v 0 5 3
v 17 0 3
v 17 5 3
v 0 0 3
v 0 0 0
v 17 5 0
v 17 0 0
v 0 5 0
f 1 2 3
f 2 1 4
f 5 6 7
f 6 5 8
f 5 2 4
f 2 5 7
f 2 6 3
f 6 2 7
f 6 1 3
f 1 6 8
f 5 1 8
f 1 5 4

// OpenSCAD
// Generated by SolidPython 1.0.1 on 2020-07-29 00:46:56


cube(size = [17, 5, 3]);
/***********************************************
*********      SolidPython code:      **********
************************************************
 
# import packages: SolidPython
from solid import *
from solid.utils import *
from itertools import chain, combinations, permutations


class Resize:

    def __init__(self, scad_file):
        self.scad_file = scad_file
        #self.scad_file = import_scad(scad_file)
        # cone/cylinder param:
        self.r1 = 0
        self.r2 = 0
        self.h = 0
        # rectangular prism param:
        self.w = 0
        self.l = 0
        # ellipse param:
        self.r = 0

    # import OpenScad code (file name corresponds to shape)


    # classify shape + parameters
    def assign(self, param1, param2, param3):
        if self.scad_file == 'cone.scad':
            self.r1 = param1
            self.r2 = param2
            self.h = param3
        elif self.scad_file == 'cylinder.scad':
            self.r1 = param1
            self.r2 = param2
            self.h = param3
        elif self.scad_file == 'rectangularPrism.scad':
            self.h = param1
            self.l = param2
            self.w = param3
        else:
            self.r = param1
            self.h = param2

    # resize parameters
    def iterate(self):
        x = range(3, 20, 2)
        i = 1
        if self.scad_file == 'cone.scad':
            tempList = list(permutations(x, 2))
            for temp in tempList:
                param1 = temp[0]
                param2 = temp[1]
                filepath = 'produced_scad_files/' + 'cone' + str(param1) + '_' + str(param2) + '_' + '.scad'
                scad_render_to_file(cylinder(h=param1, r1=param2, r2=0), filepath)

        elif self.scad_file == 'cylinder.scad':
            tempList = list(permutations(x, 3))
            for temp in tempList:
                param1 = temp[0]
                param2 = temp[1]
                filepath = 'produced_scad_files/' + 'cylinder' + str(param1) + '_' + str(param2) + '_' + '.scad'
                scad_render_to_file(cylinder(h=param1, r1=param2, r2=param2), filepath)

        elif self.scad_file == 'rectangularPrism.scad':
            tempList = list(permutations(x, 3))
            for temp in tempList:
                param1 = temp[0]
                param2 = temp[1]
                param3 = temp[2]
                filepath = 'produced_scad_files/' + 'rectangularPrism' + str(param1) + '_' + str(param2) + '_' + str(
                    param3) + '.scad'
                scad_render_to_file(cube(size=(param1, param2, param3)), filepath)

        elif self.scad_file == 'ellipse.scad':
            tempList = list(permutations(x, 4))
            for temp in tempList:
                param1 = temp[0]
                param2 = temp[1]
                param3 = temp[2]
                param4 = temp[3]
                filepath = 'produced_scad_files/' + 'ellipse' + str(param1) + '_' + str(param2) + '_' + str(param3) + '_' + str(param4) + '.scad'
                scad_render_to_file(scale([param1, param2, param3])(sphere(r=param4)), filepath)

    def render_to_scadfile(self):
        scad_render_to_file(scad, 'example.scad') 
 
************************************************/
